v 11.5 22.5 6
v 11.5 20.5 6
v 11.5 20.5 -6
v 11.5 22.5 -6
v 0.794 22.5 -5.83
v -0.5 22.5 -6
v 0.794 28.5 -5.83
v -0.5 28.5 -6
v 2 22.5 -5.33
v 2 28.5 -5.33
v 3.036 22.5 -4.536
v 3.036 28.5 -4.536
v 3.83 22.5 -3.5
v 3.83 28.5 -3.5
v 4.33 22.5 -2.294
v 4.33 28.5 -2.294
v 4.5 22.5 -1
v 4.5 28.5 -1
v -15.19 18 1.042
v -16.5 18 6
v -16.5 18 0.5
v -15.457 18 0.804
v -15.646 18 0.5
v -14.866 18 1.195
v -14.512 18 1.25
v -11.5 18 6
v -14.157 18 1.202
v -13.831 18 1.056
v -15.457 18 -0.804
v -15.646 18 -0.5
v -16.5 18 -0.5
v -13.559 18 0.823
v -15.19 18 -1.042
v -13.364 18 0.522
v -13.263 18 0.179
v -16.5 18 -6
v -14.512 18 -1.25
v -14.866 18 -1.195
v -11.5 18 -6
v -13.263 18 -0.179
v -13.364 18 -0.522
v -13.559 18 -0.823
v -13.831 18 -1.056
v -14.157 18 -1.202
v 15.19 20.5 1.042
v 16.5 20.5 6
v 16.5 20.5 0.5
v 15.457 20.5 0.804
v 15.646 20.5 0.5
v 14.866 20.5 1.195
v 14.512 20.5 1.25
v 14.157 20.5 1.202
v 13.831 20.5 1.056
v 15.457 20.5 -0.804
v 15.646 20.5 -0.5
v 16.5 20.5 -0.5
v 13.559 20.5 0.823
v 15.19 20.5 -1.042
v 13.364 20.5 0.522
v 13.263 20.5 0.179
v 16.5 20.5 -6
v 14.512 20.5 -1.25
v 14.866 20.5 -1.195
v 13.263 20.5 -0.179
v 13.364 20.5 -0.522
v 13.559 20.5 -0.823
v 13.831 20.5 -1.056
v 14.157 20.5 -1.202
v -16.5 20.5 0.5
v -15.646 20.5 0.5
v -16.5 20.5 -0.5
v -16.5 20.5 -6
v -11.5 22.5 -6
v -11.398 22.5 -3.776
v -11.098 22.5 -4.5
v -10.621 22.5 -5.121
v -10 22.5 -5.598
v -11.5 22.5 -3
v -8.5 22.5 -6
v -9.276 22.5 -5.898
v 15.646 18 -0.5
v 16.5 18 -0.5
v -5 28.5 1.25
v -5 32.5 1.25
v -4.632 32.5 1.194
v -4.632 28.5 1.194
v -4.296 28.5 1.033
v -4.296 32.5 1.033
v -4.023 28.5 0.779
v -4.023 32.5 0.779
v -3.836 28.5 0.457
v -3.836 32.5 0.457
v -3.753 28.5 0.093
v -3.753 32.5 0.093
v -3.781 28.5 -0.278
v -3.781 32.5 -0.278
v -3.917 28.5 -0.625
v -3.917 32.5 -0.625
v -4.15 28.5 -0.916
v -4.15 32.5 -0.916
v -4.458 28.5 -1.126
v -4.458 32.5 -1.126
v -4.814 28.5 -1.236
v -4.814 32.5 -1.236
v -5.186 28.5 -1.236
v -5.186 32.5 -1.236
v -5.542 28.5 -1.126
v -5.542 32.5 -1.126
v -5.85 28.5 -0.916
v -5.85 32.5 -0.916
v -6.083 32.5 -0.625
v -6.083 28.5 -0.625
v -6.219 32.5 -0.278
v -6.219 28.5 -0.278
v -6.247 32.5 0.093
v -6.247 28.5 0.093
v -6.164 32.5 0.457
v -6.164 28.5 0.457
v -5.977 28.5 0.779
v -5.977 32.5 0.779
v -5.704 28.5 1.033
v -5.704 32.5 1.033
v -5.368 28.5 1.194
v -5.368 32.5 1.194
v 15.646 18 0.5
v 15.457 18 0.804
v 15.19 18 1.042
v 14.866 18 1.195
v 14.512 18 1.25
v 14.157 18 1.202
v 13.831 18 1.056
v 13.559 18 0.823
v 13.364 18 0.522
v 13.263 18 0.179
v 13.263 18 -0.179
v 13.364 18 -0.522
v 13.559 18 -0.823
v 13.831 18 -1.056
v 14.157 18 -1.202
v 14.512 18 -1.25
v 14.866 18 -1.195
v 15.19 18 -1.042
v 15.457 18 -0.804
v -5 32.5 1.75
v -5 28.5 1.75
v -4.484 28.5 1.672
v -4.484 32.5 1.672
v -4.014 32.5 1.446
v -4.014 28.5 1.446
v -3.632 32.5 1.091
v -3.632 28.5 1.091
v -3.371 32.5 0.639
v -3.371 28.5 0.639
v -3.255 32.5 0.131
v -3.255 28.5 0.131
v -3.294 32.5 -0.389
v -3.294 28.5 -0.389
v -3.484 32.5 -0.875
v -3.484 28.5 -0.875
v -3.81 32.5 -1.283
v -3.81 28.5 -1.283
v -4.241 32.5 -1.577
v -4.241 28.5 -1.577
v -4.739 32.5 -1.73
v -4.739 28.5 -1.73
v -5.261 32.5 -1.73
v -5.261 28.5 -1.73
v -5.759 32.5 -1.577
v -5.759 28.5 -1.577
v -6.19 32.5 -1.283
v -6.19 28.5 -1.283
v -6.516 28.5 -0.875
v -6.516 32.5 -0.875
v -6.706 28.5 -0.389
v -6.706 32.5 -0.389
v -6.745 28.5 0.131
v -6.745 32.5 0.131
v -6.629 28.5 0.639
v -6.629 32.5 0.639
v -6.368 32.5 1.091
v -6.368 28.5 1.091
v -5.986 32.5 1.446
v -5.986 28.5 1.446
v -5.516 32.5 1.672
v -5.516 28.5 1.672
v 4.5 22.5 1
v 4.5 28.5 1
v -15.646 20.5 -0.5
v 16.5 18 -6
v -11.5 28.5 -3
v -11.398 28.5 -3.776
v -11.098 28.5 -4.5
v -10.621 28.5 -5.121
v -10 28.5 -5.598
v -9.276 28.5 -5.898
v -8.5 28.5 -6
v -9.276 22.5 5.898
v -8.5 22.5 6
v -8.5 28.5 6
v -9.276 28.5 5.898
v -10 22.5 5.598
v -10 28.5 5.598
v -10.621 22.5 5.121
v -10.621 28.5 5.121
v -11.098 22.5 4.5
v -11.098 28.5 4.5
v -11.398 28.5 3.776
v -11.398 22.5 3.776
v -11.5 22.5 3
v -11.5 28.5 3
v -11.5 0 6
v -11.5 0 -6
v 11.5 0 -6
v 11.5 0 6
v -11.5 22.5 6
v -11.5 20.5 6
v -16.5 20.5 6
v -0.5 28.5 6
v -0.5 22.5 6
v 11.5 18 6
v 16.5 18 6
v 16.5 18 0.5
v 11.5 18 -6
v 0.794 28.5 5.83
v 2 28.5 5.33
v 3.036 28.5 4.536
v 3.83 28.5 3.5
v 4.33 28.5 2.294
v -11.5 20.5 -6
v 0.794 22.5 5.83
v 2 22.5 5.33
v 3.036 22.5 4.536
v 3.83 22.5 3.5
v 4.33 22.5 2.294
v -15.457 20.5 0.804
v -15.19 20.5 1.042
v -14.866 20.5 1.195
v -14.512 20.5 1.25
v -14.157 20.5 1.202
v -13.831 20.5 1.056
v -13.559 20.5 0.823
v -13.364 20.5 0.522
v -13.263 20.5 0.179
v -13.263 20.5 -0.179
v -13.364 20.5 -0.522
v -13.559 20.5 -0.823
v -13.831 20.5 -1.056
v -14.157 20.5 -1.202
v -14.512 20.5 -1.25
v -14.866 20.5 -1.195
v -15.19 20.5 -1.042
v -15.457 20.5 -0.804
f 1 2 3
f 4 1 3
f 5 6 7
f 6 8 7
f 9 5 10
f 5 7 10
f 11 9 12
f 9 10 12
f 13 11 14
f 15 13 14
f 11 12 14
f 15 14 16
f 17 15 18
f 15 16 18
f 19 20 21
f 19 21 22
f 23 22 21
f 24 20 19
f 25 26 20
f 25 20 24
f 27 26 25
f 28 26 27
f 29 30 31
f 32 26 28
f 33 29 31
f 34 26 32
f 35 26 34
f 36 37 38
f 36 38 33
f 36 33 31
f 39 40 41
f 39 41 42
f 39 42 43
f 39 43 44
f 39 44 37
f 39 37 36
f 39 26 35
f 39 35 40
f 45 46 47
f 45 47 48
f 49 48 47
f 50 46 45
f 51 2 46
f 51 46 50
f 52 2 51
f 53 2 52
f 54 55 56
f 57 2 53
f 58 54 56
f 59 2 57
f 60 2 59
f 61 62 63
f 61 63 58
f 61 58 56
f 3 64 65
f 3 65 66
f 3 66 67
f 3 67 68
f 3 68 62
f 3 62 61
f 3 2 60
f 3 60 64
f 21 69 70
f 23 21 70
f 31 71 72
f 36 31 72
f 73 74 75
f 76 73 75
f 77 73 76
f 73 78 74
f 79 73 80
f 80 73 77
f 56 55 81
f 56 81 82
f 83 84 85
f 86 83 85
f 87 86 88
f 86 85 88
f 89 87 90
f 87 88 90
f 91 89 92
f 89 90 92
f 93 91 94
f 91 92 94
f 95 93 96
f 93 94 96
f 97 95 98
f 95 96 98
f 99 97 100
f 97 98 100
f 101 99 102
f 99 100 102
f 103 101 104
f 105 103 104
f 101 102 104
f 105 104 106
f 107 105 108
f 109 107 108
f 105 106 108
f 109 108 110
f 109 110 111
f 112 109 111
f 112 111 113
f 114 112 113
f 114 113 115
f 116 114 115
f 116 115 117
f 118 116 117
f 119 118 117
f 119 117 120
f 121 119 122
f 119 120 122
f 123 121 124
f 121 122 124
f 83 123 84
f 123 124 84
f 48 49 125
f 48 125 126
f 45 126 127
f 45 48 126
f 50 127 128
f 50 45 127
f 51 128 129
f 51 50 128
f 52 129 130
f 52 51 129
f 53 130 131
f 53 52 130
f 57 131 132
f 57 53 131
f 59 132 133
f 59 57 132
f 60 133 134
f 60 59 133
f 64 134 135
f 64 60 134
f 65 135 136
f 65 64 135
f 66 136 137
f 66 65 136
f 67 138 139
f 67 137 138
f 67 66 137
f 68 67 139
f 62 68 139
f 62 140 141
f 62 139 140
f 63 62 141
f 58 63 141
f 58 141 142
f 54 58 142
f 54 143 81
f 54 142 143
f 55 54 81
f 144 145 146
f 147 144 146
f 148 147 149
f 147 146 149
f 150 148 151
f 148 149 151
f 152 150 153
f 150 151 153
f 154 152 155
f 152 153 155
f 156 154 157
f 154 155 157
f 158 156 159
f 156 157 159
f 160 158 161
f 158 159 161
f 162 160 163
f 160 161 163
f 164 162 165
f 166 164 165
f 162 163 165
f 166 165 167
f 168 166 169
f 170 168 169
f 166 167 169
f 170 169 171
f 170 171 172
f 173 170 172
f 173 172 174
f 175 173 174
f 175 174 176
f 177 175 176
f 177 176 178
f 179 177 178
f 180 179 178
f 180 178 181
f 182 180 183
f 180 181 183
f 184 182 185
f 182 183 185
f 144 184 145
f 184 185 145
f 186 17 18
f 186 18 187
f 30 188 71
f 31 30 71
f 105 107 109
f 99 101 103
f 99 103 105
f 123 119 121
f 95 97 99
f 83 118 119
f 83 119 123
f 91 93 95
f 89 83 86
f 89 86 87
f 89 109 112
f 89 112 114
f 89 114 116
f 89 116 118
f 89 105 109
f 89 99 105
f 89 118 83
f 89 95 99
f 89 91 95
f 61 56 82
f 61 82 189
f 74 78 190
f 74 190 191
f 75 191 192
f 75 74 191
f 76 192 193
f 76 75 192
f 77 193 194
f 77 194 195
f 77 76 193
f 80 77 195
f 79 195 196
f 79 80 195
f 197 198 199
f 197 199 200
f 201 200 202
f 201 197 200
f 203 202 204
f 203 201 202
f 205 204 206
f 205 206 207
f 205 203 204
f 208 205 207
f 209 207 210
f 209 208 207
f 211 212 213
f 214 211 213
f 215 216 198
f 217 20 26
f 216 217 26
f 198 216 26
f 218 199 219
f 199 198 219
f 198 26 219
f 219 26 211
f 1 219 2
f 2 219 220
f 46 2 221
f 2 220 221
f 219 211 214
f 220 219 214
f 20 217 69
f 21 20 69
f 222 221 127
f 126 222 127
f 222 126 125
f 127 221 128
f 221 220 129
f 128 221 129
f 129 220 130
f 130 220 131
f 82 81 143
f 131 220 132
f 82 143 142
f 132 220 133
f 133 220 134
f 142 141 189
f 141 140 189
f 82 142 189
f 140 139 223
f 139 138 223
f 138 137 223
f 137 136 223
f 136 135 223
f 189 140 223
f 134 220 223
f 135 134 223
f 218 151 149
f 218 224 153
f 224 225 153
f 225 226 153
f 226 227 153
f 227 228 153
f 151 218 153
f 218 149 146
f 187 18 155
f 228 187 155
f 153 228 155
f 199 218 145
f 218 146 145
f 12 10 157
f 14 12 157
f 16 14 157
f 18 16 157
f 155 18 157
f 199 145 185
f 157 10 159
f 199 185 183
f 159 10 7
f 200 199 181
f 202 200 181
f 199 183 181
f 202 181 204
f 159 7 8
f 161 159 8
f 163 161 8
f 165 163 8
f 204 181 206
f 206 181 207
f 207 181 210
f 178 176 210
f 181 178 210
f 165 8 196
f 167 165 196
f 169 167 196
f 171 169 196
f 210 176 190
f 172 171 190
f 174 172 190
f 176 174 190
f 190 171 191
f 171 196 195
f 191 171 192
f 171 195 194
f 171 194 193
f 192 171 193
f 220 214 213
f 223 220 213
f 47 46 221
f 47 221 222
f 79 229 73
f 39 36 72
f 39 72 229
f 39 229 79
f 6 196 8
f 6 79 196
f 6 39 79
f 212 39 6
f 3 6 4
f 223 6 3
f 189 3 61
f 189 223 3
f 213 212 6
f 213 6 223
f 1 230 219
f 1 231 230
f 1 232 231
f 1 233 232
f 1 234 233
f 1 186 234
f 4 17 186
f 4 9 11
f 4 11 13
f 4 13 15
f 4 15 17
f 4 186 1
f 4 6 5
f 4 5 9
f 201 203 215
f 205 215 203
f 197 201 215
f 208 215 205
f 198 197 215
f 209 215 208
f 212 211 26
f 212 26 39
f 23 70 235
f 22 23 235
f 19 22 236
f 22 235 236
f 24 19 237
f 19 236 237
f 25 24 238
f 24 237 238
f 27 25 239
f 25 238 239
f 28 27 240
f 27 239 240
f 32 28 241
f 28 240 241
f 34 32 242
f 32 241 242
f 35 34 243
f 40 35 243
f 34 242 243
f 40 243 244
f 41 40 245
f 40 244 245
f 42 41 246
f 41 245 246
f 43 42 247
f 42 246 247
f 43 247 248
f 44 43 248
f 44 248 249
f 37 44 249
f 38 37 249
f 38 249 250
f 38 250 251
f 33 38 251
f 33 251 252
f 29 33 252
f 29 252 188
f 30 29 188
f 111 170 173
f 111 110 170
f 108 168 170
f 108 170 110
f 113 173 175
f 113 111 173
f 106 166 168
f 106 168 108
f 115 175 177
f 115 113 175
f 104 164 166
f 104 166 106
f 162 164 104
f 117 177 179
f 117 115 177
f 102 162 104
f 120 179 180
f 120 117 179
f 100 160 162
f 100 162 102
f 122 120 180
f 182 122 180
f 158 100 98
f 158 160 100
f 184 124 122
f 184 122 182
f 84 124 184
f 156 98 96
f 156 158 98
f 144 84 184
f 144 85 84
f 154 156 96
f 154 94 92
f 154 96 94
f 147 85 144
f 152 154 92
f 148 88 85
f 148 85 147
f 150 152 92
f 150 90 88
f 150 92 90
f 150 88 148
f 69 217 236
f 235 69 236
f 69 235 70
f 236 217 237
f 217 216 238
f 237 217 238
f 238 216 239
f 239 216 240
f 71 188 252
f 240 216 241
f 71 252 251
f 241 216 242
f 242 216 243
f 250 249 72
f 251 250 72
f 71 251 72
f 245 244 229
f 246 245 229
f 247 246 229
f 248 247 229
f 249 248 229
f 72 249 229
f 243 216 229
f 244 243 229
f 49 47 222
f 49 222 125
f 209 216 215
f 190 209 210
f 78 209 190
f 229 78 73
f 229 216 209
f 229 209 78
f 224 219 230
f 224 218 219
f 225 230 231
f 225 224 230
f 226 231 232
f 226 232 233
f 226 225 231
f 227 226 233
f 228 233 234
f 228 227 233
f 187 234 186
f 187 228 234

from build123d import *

# Parameters (mm, degrees)
SKETCH1_W           = 23
SKETCH1_H           = 12
BOSS_EXTRUDE1_DEPTH = 22.5
SKETCH2_W           = 12
SKETCH2_H           = 2.5
BOSS_EXTRUDE2_DEPTH = 5
CUT_EXTRUDE1_DEPTH  = 5
BOSS_EXTRUDE3_DEPTH = 6
FILLET1_R           = 5
SKETCH5_R           = 1.75
BOSS_EXTRUDE4_DEPTH = 4
SKETCH6_R           = 1.25
CUT_EXTRUDE2_DEPTH  = 4


with BuildPart() as part:
    # Sketch1 → Boss-Extrude1 (new body)
    with BuildSketch(Plane(origin=(0, 0, 0), x_dir=(1, 0, 0), z_dir=(0, 1, 0))):
        Rectangle(SKETCH1_W, SKETCH1_H)
    extrude(amount=BOSS_EXTRUDE1_DEPTH)

    # Sketch2 → Boss-Extrude2 (add)
    with BuildSketch(Plane(origin=(11.5, 0, 0), x_dir=(0, 0, -1), z_dir=(1, 0, 0))):
        with Locations((0, 19.25)):
            Rectangle(SKETCH2_W, SKETCH2_H)
    boss_extrude2 = extrude(amount=BOSS_EXTRUDE2_DEPTH)

    # Sketch3 → Cut-Extrude1 (cut)
    with BuildSketch(Plane(origin=(0, 20.5, 0), x_dir=(1, 0, 0), z_dir=(0, 1, 0))):
        with BuildLine():
            Line((15.645643924, 0.5), (16.5, 0.5))
            Line((16.5, 0.5), (16.5, -0.5))
            Line((16.5, -0.5), (15.645643924, -0.5))
            ThreePointArc((15.645643924, -0.5), (13.25, 0), (15.645643924, 0.5))
        make_face()
    cut_extrude1 = extrude(amount=-CUT_EXTRUDE1_DEPTH, mode=Mode.SUBTRACT)

    # Mirror1: Boss-Extrude2, Cut-Extrude1 across plane
    add(boss_extrude2.mirror(Plane(origin=(0, 0, 0), x_dir=(0, 0, 1), z_dir=(1, 0, 0))))
    add(cut_extrude1.mirror(Plane(origin=(0, 0, 0), x_dir=(0, 0, 1), z_dir=(1, 0, 0))), mode=Mode.SUBTRACT)

    # Sketch4 → Boss-Extrude3 (add)
    with BuildSketch(Plane(origin=(0, 22.5, 0), x_dir=(1, 0, 0), z_dir=(0, 1, 0))):
        with BuildLine():
            Line((-8.5, 6), (4.5, 6))
            Line((4.5, 6), (4.5, -6))
            Line((4.5, -6), (-8.5, -6))
            ThreePointArc((-8.5, -6), (-10.621320344, -5.121320344), (-11.5, -3))
            Line((-11.5, -3), (-11.5, 3))
            ThreePointArc((-11.5, 3), (-10.621320344, 5.121320344), (-8.5, 6))
        make_face()
    extrude(amount=BOSS_EXTRUDE3_DEPTH)

    # Fillet1
    fillet1_edges = [part.edges().sort_by_distance(p)[0] for p in [
        (4.5, 25.5, 6),
        (4.5, 25.5, -6),
    ]]
    fillet(fillet1_edges, radius=FILLET1_R)

    # Sketch5 → Boss-Extrude4 (add)
    with BuildSketch(Plane(origin=(0, 28.5, 0), x_dir=(1, 0, 0), z_dir=(0, 1, 0))):
        with Locations(Location((-5, 0, 0), (0, 0, 270))):
            Circle(SKETCH5_R)
    extrude(amount=BOSS_EXTRUDE4_DEPTH)

    # Sketch6 → Cut-Extrude2 (cut)
    with BuildSketch(Plane(origin=(0, 32.5, 0), x_dir=(1, 0, 0), z_dir=(0, 1, 0))):
        with Locations(Location((-5, 0, 0), (0, 0, 270))):
            Circle(SKETCH6_R)
    extrude(amount=-CUT_EXTRUDE2_DEPTH, mode=Mode.SUBTRACT)


solid = part.part
